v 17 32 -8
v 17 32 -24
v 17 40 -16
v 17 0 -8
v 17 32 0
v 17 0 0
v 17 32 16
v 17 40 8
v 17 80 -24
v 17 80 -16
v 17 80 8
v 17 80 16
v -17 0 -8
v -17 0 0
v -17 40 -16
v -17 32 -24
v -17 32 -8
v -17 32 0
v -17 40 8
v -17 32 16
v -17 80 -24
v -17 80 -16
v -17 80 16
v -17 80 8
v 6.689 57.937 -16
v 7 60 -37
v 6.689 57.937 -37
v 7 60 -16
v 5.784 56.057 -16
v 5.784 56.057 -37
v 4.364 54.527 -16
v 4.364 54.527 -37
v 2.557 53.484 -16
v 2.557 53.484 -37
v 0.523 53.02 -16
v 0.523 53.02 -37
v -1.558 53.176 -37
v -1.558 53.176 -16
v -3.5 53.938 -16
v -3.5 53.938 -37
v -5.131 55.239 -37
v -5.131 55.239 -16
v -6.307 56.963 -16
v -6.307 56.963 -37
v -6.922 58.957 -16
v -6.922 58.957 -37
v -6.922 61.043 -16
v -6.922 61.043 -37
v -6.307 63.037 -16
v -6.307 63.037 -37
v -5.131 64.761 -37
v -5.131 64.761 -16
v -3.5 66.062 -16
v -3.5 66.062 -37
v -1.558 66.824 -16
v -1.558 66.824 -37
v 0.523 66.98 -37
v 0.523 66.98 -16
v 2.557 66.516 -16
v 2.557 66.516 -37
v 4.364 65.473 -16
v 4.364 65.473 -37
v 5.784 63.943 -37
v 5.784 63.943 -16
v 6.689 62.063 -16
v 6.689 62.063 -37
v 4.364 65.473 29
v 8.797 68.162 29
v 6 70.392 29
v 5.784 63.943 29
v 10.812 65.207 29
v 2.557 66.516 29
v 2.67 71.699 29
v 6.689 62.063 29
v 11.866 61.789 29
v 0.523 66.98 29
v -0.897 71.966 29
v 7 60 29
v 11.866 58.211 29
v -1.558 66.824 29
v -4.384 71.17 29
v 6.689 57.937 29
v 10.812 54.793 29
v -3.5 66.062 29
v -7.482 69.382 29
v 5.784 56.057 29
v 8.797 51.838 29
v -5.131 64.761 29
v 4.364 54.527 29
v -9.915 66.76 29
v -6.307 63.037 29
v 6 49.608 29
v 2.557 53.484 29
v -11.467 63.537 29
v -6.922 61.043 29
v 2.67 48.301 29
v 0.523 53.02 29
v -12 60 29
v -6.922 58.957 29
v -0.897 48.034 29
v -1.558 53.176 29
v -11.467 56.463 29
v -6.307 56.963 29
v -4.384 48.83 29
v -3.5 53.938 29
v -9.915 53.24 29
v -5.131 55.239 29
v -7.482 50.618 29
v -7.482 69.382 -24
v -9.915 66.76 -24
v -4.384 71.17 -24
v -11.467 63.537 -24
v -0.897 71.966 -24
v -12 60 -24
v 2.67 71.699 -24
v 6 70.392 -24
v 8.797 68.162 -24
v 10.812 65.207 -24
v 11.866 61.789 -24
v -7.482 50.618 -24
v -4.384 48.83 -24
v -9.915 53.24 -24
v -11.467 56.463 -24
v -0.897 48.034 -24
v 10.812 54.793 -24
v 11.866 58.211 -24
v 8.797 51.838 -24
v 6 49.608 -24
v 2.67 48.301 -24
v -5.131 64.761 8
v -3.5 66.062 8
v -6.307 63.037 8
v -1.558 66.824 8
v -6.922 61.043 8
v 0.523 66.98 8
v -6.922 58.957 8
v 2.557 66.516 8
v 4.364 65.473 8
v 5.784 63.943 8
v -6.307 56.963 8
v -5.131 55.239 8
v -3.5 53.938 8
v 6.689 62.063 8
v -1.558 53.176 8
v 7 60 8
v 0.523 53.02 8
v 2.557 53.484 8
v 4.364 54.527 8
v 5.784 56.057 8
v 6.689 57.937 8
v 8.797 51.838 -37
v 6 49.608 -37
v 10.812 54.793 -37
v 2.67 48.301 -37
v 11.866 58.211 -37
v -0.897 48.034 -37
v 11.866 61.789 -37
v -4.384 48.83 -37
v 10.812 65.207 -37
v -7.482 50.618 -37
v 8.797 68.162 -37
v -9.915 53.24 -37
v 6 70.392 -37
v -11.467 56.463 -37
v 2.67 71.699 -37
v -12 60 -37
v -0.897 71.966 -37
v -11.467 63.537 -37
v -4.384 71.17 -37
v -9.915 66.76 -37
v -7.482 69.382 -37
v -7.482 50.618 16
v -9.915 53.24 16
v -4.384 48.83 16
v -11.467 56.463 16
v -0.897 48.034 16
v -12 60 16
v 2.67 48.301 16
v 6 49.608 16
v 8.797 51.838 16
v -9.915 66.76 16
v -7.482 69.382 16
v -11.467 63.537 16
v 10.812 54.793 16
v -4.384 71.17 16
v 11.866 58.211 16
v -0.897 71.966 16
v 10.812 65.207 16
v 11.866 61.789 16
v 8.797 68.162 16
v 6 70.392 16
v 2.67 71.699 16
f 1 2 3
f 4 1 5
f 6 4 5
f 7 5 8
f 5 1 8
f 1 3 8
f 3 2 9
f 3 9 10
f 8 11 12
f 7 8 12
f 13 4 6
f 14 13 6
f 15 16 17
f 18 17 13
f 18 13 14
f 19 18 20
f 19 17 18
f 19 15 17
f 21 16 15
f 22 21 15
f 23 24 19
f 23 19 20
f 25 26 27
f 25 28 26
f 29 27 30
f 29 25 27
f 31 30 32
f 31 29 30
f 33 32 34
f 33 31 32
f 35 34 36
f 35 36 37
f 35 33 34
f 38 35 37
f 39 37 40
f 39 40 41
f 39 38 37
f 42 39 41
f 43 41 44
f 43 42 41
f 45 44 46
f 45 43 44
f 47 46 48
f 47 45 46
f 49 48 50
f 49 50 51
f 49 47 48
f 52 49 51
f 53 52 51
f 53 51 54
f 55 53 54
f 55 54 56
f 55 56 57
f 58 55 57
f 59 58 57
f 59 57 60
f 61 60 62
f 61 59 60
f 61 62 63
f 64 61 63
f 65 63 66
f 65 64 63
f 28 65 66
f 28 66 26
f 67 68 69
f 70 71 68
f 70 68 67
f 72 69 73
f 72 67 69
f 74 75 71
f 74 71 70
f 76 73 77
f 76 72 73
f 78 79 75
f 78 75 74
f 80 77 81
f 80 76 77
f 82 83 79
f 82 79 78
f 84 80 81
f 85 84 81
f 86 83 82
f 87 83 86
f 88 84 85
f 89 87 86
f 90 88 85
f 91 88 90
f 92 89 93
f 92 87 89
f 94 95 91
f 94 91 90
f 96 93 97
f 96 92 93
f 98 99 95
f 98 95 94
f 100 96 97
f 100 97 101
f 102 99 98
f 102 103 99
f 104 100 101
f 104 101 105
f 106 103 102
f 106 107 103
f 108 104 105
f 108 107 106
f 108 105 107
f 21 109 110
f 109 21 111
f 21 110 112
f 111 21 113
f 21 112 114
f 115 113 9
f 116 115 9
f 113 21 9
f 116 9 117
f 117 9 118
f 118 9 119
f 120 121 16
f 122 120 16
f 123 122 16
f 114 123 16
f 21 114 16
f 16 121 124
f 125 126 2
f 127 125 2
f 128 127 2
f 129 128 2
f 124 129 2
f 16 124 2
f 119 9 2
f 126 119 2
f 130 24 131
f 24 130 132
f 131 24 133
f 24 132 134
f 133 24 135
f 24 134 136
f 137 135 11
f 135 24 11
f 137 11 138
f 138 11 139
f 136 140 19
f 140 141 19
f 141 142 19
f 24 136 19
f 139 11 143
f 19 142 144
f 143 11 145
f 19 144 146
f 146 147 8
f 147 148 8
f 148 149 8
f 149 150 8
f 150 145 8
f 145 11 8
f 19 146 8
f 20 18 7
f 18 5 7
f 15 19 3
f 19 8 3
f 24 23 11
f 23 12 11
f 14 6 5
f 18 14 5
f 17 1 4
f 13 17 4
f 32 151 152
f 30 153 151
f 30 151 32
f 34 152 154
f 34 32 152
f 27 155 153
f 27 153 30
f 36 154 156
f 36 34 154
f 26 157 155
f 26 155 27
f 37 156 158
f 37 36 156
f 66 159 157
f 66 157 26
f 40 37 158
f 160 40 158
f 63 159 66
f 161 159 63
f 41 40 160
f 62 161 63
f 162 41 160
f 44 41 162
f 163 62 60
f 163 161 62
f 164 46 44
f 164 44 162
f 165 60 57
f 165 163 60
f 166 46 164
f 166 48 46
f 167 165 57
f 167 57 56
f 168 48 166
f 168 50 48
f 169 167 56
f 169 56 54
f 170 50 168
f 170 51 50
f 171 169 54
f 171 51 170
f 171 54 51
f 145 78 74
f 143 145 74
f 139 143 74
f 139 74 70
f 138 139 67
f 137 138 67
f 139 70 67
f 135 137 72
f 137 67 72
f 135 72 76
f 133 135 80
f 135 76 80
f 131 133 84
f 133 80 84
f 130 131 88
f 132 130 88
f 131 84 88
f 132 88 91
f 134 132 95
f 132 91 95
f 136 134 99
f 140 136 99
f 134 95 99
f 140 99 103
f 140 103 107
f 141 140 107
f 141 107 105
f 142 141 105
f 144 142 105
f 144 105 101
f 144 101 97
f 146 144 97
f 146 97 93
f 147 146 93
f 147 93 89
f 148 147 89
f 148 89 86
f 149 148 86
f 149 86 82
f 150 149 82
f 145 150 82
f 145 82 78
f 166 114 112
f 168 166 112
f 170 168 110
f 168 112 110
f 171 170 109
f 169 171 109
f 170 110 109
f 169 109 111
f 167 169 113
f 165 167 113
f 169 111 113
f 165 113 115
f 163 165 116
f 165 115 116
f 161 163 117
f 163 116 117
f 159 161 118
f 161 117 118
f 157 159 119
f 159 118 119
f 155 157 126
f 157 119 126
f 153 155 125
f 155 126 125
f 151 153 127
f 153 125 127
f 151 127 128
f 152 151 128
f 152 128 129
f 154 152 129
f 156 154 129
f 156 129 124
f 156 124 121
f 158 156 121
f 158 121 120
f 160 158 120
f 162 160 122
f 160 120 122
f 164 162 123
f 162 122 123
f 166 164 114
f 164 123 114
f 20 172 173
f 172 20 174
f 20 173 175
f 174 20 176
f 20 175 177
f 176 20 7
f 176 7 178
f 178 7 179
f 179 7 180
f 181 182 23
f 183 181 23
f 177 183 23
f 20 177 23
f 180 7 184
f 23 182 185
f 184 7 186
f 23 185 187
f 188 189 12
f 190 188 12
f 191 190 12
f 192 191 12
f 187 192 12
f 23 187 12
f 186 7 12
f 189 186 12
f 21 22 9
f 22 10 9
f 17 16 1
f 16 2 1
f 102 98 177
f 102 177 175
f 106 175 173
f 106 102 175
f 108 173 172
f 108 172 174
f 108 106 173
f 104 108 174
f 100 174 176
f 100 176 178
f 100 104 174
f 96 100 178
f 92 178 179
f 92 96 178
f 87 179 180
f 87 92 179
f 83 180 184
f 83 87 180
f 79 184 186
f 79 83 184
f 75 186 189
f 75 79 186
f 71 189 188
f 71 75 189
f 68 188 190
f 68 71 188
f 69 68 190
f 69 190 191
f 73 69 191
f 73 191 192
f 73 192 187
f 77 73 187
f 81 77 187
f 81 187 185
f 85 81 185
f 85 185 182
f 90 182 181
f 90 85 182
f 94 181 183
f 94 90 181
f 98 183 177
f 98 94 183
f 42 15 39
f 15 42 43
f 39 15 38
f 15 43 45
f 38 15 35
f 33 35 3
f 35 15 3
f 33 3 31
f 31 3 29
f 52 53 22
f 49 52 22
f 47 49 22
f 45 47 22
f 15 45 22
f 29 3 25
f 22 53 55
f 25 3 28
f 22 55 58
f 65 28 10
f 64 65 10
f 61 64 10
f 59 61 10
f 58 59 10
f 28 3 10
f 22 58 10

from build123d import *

# Parameters (mm, degrees)
SALIENTE_EXTRUIR1_DEPTH = 17
CROQUIS10_R             = 7
CORTAR_EXTRUIR2_DEPTH   = 92.043945433
SALIENTE_EXTRUIR5_START = 13
CROQUIS11_R             = 12
CROQUIS11_R_2           = 7
SALIENTE_EXTRUIR5_DEPTH = 13
CROQUIS12_R             = 12
CROQUIS12_R_2           = 7
SALIENTE_EXTRUIR6_DEPTH = 13


with BuildPart() as part:
    # Croquis1 → Saliente-Extruir1 (new, symmetric)
    with BuildSketch(Plane(origin=(0, 0, 0), x_dir=(0, 0, -1), z_dir=(1, 0, 0))):
        Polygon((0, 0), (0, 32), (-16, 32), (-16, 80), (-8, 80), (-8, 40), (16, 40), (16, 80), (24, 80), (24, 32), (8, 32), (8, 0), align=None)
    extrude(amount=SALIENTE_EXTRUIR1_DEPTH, both=True)

    # Croquis10 → Cortar-Extruir2 (cut, through all)
    with BuildSketch(Plane.XY.offset(16)):
        with Locations((0, 60)):
            Circle(CROQUIS10_R)
    extrude(amount=-CORTAR_EXTRUIR2_DEPTH, mode=Mode.SUBTRACT)

    # Croquis11 → Saliente-Extruir5 (add)
    with BuildSketch(Plane.XY.offset(16).offset(SALIENTE_EXTRUIR5_START)):
        with Locations(Location((0, 60, 0), (0, 0, 180))):
            Circle(CROQUIS11_R)
        with Locations((0, 60)):
            Circle(CROQUIS11_R_2, mode=Mode.SUBTRACT)
    extrude(amount=-SALIENTE_EXTRUIR5_DEPTH)

    # Croquis12 → Saliente-Extruir6 (add)
    with BuildSketch(Plane(origin=(0, 0, -24), x_dir=(-1, 0, 0), z_dir=(0, 0, -1))):
        with Locations((0, 60)):
            Circle(CROQUIS12_R)
        with Locations(Location((0, 60, 0), (0, 0, 180))):
            Circle(CROQUIS12_R_2, mode=Mode.SUBTRACT)
    extrude(amount=SALIENTE_EXTRUIR6_DEPTH)


solid = part.part
